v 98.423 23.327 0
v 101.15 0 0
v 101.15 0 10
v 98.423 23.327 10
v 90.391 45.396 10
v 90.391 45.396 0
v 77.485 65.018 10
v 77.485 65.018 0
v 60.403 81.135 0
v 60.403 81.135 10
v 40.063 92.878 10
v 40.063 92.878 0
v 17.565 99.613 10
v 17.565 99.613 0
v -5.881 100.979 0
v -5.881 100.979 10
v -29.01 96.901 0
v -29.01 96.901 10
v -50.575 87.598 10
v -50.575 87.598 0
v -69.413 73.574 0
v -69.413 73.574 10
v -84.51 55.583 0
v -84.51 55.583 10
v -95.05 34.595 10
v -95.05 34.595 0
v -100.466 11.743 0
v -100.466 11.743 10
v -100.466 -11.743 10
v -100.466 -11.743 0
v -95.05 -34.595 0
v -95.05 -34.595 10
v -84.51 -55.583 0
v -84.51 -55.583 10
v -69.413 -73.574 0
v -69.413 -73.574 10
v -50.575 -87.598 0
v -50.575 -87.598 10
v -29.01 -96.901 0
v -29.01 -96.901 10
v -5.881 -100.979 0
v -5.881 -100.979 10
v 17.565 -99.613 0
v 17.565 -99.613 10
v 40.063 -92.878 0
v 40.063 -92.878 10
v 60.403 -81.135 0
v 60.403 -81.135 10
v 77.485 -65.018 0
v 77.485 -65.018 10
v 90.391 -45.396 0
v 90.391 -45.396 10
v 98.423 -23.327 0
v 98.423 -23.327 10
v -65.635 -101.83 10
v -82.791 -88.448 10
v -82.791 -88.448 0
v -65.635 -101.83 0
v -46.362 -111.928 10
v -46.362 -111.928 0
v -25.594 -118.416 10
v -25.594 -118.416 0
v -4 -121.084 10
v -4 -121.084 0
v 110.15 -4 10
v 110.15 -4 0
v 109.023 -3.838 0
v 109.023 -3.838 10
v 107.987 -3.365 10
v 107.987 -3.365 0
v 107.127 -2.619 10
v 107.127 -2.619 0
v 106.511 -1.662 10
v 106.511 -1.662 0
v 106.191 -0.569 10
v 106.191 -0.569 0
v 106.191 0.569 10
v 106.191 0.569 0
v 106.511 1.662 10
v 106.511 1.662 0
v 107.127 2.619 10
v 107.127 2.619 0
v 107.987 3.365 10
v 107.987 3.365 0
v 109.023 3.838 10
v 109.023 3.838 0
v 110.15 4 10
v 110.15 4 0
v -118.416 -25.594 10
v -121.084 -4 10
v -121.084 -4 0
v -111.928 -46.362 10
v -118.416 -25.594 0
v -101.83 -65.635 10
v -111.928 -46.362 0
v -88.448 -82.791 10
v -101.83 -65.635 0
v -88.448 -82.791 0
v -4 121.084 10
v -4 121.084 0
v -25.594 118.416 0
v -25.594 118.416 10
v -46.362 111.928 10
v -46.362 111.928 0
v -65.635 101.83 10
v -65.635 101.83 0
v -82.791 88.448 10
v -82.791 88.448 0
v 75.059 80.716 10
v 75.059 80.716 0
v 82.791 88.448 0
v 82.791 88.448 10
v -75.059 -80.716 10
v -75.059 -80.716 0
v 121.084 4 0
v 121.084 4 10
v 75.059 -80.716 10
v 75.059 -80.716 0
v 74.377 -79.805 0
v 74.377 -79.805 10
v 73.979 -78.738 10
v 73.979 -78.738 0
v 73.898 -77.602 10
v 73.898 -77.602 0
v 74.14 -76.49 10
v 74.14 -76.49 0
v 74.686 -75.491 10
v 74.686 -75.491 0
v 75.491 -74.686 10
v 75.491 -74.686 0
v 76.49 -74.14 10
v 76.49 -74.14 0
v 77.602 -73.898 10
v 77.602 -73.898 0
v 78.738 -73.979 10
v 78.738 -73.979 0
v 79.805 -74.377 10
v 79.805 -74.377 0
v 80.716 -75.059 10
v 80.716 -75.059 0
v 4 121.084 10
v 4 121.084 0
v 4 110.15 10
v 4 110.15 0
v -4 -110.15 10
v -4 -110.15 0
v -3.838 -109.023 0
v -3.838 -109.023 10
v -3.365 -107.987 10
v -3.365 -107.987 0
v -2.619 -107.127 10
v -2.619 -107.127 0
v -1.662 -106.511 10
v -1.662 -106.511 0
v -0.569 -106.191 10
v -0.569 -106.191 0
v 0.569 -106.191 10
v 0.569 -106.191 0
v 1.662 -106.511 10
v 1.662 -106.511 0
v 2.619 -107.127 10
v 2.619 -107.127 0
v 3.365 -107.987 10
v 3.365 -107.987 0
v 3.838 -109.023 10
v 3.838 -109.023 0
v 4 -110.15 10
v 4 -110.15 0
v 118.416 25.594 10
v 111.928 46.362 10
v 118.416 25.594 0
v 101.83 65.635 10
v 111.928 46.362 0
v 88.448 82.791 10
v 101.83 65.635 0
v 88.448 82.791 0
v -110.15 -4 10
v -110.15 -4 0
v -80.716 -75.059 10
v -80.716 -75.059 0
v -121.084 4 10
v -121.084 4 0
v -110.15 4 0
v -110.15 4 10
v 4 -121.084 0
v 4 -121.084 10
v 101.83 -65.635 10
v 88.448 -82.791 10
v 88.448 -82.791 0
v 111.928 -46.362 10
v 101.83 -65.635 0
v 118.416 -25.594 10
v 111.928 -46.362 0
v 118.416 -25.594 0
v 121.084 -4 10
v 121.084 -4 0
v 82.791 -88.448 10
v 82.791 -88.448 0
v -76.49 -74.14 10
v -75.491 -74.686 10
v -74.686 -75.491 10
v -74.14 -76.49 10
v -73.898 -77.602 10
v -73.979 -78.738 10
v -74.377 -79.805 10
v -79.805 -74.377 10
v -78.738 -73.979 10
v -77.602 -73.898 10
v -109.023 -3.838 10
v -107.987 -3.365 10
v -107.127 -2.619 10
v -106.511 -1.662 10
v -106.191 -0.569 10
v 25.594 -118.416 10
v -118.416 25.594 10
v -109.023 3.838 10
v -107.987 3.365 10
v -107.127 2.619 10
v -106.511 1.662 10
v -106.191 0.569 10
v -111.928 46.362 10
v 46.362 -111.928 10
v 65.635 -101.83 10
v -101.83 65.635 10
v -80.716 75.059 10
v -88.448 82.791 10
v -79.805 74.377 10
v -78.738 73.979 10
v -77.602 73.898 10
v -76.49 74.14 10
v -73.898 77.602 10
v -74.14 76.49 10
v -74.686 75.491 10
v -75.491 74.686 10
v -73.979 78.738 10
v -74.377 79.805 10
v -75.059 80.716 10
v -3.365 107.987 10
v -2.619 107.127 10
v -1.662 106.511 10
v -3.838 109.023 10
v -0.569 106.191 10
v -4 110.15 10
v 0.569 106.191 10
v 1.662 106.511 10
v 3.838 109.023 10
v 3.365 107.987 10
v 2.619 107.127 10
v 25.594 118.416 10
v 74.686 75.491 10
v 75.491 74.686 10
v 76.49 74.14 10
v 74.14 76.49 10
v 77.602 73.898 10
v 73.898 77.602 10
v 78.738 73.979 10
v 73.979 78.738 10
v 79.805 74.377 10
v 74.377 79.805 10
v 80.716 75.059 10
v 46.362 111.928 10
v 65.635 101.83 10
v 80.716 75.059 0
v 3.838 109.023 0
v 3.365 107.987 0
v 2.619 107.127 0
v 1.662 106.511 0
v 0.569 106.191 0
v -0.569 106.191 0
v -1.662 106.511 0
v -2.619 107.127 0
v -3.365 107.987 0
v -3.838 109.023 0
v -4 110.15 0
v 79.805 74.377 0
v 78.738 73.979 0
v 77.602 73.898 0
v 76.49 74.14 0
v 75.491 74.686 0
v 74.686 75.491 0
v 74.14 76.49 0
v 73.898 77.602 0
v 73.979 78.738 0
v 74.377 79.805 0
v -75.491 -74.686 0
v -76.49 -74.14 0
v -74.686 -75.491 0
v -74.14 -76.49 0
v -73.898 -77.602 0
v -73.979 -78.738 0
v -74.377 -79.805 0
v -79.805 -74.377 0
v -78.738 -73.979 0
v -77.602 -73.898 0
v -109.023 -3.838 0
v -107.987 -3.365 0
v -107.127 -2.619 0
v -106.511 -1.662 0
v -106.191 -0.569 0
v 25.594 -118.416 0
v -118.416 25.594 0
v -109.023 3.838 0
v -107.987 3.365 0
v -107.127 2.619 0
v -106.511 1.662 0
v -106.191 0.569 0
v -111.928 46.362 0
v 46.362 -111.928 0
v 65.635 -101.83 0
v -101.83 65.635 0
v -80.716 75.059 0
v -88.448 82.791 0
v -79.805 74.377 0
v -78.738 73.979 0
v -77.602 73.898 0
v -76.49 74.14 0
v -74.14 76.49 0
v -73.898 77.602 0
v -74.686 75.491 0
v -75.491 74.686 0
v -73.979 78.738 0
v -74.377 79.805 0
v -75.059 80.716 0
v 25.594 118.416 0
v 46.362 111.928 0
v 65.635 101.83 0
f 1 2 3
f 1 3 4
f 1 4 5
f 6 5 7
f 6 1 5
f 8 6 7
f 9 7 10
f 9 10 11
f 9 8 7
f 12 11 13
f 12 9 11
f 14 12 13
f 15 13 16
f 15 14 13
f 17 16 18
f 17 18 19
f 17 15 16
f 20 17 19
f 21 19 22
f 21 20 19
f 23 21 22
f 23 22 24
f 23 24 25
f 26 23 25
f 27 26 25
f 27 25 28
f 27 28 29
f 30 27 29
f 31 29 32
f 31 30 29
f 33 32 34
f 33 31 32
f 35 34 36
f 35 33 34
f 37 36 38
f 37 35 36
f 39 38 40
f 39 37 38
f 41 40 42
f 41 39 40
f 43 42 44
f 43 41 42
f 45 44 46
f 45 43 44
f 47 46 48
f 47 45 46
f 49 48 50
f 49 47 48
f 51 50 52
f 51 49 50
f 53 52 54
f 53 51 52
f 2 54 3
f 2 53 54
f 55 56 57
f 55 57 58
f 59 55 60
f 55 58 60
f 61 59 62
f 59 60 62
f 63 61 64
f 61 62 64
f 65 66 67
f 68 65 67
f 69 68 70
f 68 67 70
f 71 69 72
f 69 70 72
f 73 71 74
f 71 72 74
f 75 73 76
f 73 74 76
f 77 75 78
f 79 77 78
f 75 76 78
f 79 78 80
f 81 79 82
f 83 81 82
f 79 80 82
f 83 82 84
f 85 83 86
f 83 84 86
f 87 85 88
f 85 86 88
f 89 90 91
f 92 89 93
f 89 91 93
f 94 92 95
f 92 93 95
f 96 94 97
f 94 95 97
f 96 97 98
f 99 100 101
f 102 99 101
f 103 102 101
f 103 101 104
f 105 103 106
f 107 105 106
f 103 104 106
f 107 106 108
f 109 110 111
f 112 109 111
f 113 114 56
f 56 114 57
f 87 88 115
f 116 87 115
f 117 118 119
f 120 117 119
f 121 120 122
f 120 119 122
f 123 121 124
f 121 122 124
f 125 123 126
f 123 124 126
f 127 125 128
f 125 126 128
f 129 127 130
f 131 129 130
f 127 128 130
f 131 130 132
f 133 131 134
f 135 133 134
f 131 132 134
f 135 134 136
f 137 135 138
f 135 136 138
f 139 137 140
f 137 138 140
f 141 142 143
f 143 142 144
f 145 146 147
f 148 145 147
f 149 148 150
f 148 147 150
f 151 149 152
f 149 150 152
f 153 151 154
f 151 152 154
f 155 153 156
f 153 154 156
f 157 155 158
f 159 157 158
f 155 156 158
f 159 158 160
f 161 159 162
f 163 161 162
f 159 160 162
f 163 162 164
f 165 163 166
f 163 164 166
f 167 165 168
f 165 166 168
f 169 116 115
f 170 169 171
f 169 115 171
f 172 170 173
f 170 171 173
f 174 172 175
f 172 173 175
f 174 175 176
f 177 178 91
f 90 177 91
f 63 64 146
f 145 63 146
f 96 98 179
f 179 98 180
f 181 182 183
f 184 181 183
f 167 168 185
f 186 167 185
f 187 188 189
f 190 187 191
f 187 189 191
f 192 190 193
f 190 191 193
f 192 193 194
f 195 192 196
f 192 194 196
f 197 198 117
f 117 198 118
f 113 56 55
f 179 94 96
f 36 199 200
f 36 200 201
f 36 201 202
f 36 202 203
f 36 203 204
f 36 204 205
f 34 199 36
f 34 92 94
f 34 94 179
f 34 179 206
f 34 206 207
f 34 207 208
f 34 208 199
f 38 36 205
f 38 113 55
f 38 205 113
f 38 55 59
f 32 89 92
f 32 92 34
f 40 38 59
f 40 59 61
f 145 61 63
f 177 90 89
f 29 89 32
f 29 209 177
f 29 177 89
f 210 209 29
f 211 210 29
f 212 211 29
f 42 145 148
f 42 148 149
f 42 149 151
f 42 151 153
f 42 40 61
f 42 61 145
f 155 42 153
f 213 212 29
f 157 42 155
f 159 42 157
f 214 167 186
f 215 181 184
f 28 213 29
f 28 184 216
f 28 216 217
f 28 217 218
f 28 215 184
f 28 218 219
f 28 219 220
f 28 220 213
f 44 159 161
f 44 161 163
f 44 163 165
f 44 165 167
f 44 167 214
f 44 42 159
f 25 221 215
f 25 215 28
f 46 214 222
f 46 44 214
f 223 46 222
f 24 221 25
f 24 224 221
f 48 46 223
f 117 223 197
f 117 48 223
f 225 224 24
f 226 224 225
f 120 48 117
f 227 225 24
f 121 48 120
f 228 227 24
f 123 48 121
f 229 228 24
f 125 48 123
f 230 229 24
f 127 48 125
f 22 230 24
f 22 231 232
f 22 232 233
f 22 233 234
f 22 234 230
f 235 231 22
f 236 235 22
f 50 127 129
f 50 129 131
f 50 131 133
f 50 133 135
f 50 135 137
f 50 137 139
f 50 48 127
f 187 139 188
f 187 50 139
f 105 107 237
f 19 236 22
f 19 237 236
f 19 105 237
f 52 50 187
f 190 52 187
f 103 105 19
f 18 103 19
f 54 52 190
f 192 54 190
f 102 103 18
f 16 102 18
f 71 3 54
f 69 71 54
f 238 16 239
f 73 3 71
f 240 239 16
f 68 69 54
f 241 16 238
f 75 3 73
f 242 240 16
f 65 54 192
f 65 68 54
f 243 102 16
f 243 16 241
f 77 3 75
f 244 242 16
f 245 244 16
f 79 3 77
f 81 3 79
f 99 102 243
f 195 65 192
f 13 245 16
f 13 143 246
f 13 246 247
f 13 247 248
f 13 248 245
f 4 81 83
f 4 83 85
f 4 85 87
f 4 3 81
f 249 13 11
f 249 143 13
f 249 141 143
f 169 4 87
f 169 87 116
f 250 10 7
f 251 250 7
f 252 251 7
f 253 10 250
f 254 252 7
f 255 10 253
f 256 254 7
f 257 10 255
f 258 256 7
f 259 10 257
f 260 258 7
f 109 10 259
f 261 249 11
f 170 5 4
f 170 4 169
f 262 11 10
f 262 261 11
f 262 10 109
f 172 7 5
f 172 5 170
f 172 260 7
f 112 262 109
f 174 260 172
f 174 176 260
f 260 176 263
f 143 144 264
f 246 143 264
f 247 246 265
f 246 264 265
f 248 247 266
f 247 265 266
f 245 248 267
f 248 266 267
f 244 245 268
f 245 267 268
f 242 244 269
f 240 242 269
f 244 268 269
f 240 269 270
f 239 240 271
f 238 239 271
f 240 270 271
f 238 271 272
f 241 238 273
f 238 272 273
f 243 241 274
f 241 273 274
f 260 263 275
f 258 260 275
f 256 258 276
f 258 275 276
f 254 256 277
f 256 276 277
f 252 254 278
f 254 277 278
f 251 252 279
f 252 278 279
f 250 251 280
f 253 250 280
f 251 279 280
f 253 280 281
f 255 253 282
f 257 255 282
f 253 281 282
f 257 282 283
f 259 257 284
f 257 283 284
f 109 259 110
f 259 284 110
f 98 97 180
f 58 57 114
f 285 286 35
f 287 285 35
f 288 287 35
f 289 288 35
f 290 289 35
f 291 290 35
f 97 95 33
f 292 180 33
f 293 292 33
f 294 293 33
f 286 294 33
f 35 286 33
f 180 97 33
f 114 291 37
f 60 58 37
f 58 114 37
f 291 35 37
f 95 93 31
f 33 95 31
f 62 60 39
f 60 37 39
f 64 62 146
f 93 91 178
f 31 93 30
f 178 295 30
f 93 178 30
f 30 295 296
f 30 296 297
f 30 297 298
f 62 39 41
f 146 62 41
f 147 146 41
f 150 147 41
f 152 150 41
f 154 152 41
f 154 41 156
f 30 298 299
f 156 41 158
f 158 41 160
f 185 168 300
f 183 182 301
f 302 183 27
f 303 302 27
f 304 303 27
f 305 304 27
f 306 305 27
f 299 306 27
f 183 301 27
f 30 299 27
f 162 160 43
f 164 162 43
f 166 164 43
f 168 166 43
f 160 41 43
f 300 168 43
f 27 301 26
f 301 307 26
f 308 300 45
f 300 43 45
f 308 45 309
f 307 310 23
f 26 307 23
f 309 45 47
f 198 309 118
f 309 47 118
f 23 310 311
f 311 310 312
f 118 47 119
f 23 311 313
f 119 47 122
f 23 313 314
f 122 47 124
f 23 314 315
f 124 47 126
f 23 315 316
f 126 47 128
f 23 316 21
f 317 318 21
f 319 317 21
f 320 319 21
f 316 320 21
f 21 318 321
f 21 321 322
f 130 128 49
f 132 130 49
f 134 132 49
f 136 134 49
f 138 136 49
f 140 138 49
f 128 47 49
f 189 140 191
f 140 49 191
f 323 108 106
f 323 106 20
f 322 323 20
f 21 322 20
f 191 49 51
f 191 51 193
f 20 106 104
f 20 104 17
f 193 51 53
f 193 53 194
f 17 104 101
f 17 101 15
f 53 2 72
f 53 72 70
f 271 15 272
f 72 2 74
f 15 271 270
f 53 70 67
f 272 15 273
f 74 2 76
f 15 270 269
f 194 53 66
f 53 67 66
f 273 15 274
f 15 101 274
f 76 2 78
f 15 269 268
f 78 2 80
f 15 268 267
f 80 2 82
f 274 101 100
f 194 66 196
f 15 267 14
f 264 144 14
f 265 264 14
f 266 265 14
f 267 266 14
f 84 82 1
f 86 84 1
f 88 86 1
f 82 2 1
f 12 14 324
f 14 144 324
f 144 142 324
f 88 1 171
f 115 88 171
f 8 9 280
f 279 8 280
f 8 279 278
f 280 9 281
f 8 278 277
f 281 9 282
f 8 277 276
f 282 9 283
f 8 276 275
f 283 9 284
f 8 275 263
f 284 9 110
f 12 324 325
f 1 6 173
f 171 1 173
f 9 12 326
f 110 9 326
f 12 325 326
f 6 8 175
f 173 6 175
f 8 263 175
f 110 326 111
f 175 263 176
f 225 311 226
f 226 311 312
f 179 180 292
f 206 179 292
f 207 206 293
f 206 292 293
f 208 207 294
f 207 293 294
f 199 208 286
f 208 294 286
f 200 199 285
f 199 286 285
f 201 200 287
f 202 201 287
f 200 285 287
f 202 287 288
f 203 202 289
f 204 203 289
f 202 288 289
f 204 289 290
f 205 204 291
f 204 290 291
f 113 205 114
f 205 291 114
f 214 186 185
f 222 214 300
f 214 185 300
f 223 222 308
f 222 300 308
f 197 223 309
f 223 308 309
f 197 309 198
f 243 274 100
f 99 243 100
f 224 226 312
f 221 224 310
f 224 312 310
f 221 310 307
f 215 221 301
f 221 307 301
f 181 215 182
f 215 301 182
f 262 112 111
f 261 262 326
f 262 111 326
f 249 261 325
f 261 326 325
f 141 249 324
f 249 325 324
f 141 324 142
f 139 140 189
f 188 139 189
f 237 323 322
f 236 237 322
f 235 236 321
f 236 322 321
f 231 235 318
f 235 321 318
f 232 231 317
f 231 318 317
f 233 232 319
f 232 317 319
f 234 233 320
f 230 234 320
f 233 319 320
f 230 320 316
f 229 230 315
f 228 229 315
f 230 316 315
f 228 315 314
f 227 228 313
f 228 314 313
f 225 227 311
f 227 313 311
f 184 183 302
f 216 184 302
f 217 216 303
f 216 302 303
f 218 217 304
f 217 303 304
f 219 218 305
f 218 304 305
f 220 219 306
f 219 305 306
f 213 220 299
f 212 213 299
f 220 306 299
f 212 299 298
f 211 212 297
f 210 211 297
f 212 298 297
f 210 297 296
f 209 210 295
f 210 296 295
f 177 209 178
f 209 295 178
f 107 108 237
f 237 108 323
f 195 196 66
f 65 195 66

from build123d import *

# Parameters (mm, degrees)
SKETCH1_R           = 121.15
SKETCH1_R_2         = 101.15
BOSS_EXTRUDE1_DEPTH = 10
CUT_EXTRUDE1_DEPTH  = 10
CIRPATTERN1_COUNT   = 8


with BuildPart() as part:
    # Sketch1 → Boss-Extrude1 (new body)
    with BuildSketch(Plane.XY):
        Circle(SKETCH1_R)
        Circle(SKETCH1_R_2, mode=Mode.SUBTRACT)
    extrude(amount=BOSS_EXTRUDE1_DEPTH)

    # Sketch2 → Cut-Extrude1 (cut)
    with BuildSketch(Plane.XY):
        with BuildLine():
            Line((-4, 110.15), (-4, 123.851971246))
            Line((-4, 123.851971246), (4, 123.851971246))
            Line((4, 123.851971246), (4, 110.15))
            ThreePointArc((4, 110.15), (0, 106.15), (-4, 110.15))
        make_face()
    cut_extrude1 = extrude(amount=CUT_EXTRUDE1_DEPTH, mode=Mode.SUBTRACT)

    # CirPattern1: Cut-Extrude1 ×8 about axis
    cirpattern1_axis = Axis((0, 0, 0), (0, 0, 1))
    for i in range(1, CIRPATTERN1_COUNT):
        add(cut_extrude1.rotate(cirpattern1_axis, i * 360 / CIRPATTERN1_COUNT), mode=Mode.SUBTRACT)


solid = part.part
